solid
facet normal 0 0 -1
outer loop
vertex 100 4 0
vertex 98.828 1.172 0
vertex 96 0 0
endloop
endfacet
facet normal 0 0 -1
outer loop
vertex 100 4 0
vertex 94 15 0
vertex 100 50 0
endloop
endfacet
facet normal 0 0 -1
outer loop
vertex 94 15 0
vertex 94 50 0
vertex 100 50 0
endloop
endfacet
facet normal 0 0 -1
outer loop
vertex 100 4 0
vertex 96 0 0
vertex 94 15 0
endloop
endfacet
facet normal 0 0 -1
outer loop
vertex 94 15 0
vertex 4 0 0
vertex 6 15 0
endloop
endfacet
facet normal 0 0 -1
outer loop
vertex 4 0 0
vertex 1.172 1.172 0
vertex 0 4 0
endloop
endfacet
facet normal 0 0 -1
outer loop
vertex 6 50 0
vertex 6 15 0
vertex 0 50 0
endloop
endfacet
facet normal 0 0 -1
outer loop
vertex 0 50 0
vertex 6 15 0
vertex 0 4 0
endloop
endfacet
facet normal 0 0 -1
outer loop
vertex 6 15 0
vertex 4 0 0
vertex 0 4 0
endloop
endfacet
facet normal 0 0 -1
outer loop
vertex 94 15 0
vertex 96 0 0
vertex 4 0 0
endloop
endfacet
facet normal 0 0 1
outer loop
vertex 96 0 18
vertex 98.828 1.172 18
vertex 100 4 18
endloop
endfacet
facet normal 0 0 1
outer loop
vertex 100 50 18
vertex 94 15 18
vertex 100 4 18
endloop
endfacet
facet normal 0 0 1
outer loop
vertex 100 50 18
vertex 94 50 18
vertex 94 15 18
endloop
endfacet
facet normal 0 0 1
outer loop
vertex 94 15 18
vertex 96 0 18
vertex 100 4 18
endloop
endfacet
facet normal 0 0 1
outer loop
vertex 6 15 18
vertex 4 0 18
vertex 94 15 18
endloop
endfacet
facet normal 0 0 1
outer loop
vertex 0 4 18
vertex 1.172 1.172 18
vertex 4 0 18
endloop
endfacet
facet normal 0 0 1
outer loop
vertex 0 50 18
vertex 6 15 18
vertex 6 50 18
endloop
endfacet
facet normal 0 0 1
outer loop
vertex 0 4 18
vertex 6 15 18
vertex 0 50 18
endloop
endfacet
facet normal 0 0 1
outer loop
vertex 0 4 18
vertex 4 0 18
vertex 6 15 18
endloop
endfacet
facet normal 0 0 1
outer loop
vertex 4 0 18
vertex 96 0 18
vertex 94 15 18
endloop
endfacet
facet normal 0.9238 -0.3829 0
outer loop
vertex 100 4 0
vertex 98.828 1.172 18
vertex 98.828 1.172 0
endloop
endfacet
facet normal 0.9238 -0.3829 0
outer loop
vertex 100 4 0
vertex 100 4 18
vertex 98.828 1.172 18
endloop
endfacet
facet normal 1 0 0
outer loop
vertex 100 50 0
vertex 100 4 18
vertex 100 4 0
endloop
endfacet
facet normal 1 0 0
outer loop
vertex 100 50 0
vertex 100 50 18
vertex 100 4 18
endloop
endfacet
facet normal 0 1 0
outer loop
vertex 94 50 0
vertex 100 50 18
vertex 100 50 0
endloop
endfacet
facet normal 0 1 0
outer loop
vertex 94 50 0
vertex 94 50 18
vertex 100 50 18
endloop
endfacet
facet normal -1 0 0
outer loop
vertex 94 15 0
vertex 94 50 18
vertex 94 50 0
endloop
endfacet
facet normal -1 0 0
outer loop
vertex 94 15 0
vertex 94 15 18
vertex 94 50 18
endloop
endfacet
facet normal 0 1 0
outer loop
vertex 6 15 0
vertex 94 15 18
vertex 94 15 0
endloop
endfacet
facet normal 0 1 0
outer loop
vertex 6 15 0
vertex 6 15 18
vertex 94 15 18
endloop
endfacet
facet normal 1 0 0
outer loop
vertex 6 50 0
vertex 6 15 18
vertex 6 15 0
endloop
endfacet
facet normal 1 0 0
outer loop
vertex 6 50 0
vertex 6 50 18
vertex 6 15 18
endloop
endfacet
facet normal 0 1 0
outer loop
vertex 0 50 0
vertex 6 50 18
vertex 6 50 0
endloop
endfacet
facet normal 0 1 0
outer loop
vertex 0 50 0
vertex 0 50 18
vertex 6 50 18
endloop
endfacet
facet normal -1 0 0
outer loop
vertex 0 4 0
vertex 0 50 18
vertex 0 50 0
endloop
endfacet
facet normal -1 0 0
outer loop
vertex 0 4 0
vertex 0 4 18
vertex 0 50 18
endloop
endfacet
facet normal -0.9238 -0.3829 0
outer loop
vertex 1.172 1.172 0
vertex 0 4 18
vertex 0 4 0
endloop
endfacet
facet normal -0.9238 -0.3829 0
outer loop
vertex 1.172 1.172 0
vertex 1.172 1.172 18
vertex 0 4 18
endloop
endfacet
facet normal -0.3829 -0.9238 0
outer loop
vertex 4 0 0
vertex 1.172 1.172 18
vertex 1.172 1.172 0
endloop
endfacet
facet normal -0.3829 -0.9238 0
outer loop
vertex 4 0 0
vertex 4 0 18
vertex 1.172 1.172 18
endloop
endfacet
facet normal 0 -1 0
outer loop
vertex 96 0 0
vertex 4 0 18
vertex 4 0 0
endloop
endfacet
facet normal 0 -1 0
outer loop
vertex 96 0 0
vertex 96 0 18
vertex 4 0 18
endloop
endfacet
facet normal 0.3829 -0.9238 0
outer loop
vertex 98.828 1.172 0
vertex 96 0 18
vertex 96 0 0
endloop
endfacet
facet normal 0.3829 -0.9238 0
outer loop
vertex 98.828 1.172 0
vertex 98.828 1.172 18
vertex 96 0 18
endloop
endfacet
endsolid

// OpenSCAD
$fn = 32;

// ----------------------------------------------------------------------
// Heat sink frame: 100 x 50 mm frame, 6 mm walls
// ----------------------------------------------------------------------

// --- parameters (mm) ---
profile_height = 18;      // extrusion height
profile_points = 12;      // points of the closed outline

profile = [[0, 4], [1.172, 1.172], [4, 0], [96, 0], [98.828, 1.172], [100, 4], [100, 50], [94, 50], [94, 15], [6, 15], [6, 50], [0, 50]];  // single closed polygon, 12 points, counter clockwise

// --- the one profile operation ---
linear_extrude(height = profile_height) polygon(points = profile);
